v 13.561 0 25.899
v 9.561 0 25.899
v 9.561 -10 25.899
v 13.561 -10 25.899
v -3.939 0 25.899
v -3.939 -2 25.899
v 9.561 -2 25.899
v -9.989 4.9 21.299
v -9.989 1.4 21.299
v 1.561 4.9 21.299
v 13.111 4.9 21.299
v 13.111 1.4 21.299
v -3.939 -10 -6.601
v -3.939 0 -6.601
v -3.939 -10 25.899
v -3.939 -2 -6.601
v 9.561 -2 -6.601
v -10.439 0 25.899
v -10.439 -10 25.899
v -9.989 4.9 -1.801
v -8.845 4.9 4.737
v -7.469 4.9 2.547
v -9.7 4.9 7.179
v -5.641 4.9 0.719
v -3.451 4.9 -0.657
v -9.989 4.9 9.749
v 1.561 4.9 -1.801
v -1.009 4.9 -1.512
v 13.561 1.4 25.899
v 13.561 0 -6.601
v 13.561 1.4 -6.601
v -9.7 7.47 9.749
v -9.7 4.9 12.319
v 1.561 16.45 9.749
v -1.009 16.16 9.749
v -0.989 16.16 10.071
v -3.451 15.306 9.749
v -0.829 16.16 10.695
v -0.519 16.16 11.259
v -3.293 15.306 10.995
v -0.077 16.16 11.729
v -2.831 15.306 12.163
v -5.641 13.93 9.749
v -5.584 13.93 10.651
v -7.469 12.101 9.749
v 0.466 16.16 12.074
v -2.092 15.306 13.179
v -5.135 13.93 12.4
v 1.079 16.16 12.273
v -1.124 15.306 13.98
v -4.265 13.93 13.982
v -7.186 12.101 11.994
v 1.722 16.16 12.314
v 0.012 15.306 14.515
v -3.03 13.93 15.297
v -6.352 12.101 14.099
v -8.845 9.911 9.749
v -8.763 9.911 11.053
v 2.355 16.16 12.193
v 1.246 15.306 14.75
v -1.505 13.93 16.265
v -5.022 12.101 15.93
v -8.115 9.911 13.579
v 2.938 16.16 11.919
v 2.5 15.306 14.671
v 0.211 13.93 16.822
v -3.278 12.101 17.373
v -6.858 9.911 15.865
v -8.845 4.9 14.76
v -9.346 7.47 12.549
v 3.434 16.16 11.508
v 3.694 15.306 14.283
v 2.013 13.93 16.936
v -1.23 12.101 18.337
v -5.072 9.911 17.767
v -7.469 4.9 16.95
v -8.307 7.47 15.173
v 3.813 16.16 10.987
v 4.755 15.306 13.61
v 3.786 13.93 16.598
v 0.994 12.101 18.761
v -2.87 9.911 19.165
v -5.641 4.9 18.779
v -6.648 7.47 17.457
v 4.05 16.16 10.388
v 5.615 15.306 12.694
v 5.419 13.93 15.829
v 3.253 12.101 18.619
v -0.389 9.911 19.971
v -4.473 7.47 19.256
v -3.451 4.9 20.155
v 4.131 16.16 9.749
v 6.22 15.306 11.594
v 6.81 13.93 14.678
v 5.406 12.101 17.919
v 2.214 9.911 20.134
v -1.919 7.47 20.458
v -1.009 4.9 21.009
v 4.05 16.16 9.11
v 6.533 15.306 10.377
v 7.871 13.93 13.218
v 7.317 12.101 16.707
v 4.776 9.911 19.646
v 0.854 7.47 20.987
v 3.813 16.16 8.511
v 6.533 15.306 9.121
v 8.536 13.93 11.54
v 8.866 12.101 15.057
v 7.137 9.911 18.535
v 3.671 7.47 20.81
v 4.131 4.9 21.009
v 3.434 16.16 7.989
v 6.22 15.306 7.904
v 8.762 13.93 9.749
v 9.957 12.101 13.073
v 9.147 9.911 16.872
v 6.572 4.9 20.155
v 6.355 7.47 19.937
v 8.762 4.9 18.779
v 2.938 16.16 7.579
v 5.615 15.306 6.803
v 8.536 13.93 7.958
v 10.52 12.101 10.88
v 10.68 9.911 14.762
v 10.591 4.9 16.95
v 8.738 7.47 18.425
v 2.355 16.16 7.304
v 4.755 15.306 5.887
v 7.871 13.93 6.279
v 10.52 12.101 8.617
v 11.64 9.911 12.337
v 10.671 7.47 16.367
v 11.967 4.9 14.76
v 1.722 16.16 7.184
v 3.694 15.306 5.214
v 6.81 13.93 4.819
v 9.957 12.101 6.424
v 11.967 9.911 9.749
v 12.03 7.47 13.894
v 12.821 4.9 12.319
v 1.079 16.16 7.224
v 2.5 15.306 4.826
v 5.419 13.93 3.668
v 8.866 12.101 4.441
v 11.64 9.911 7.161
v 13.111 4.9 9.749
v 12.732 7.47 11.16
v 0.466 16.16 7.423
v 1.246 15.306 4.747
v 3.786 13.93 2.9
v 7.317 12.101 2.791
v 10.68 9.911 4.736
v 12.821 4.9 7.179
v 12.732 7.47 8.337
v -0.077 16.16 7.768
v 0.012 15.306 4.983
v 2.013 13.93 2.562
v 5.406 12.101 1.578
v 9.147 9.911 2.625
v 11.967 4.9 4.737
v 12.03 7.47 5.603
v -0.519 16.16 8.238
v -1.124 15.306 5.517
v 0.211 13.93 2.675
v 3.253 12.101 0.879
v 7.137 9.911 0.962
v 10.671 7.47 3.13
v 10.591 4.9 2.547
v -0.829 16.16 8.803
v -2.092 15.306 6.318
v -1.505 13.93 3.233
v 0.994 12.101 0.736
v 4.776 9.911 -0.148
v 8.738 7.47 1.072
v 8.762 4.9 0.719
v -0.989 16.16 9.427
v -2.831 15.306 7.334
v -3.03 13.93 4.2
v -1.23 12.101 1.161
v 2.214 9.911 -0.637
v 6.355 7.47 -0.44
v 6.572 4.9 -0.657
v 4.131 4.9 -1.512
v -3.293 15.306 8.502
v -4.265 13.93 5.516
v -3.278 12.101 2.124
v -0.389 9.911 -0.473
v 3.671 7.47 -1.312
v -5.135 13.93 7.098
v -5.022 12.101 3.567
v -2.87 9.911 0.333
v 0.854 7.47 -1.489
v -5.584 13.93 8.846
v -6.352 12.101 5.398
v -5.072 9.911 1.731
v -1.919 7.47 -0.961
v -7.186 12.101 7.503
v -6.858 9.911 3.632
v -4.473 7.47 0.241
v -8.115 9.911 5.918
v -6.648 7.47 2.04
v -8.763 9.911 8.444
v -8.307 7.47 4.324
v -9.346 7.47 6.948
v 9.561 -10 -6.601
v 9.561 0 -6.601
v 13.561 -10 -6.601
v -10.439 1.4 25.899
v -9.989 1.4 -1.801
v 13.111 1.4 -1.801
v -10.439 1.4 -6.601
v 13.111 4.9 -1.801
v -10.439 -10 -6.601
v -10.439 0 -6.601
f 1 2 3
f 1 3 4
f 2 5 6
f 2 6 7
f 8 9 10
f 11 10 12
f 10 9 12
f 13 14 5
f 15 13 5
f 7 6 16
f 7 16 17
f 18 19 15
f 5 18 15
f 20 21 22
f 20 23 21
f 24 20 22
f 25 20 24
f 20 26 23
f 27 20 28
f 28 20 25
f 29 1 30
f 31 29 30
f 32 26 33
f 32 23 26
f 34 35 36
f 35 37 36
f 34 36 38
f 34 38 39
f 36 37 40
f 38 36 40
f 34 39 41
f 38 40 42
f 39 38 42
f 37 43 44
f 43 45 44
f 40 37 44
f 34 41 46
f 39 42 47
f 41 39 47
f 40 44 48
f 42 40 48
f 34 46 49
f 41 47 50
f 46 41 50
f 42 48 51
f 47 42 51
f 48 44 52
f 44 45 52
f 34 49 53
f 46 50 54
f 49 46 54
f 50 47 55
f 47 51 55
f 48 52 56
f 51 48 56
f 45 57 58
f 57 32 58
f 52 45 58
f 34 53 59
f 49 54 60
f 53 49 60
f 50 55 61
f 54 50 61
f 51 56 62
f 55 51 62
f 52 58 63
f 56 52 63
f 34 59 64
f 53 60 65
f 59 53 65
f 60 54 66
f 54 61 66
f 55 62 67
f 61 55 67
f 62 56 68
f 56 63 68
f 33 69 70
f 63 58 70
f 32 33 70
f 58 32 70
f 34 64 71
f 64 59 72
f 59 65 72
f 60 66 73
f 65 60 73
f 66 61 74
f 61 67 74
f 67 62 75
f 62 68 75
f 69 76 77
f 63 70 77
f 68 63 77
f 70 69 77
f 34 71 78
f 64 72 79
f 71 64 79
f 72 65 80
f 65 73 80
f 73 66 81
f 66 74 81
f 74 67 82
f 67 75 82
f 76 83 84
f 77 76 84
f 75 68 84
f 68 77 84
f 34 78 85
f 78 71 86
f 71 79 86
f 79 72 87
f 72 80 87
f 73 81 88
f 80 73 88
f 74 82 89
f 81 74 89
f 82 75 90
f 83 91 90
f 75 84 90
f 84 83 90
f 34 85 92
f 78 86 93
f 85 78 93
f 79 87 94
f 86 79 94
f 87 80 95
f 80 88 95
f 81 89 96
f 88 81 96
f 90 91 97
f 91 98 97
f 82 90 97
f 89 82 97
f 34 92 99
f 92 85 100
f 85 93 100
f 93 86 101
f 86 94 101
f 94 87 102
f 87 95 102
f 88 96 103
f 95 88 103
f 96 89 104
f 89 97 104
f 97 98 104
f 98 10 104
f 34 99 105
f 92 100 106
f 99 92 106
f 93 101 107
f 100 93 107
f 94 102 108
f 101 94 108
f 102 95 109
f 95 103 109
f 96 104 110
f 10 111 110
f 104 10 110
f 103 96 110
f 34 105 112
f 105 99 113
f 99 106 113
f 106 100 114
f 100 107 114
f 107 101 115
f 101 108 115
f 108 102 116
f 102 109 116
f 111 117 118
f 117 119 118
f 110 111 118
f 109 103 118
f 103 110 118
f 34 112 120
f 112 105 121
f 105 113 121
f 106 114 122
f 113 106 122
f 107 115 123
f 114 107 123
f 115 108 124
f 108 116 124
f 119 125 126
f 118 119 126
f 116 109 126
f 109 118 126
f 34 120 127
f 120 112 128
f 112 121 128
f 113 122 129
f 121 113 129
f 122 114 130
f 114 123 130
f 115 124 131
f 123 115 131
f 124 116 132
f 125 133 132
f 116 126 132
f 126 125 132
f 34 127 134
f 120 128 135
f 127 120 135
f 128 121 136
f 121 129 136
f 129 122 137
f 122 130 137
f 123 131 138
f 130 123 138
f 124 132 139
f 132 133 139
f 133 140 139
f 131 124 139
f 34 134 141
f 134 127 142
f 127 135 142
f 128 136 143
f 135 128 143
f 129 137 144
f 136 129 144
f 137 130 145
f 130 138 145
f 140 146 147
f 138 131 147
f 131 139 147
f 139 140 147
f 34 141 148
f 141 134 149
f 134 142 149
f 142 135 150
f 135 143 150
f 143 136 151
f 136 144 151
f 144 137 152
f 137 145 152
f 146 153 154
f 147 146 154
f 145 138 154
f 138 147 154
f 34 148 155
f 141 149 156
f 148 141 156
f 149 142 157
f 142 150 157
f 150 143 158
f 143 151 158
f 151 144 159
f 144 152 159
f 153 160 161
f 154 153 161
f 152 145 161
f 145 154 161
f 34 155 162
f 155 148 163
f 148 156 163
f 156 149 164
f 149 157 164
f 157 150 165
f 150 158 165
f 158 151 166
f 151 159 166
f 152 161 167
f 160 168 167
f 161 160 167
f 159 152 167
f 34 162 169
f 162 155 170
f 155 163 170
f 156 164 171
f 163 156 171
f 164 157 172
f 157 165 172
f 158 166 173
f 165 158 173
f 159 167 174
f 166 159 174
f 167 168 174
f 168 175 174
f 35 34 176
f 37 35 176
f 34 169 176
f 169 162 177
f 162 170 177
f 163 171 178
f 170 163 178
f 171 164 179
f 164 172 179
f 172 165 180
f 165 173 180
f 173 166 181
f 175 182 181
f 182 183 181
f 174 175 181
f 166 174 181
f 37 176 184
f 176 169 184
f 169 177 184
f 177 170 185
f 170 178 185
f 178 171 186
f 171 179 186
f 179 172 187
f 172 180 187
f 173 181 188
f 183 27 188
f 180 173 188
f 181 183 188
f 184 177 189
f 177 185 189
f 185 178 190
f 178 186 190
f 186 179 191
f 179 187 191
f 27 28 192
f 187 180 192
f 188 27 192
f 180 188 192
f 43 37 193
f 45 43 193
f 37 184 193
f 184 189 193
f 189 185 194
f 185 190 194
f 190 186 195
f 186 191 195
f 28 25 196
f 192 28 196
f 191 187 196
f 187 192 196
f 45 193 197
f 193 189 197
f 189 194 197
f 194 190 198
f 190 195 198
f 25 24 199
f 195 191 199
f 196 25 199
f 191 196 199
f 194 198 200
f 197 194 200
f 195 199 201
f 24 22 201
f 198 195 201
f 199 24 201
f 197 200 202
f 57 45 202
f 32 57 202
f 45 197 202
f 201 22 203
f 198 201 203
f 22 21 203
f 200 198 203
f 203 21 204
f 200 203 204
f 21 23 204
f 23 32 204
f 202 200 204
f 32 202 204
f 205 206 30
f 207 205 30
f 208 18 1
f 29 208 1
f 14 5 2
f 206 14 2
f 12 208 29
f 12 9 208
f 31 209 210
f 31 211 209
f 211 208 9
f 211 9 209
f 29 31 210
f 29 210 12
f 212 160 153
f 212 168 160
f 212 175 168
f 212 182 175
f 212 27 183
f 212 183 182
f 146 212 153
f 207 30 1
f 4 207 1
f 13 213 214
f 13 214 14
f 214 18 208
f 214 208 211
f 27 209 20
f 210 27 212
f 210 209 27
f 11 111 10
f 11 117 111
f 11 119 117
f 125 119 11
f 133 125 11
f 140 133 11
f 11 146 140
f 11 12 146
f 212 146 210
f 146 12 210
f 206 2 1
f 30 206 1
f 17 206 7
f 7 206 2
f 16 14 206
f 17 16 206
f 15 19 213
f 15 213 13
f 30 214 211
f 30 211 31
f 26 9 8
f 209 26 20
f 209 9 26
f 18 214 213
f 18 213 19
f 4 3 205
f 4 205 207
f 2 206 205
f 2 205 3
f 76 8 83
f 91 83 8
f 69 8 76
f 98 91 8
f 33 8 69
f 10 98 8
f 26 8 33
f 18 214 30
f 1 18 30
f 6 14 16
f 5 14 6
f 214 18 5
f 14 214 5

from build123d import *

# Parameters (mm, degrees)
SKETCH1_W             = 24
SKETCH1_H             = 32.5
BOSS_EXTRUDE1_DEPTH   = 1.4
SKETCH2_W             = 23.1
SKETCH2_H             = 23.1
BOSS_EXTRUDE2_DEPTH   = 3.5
SKETCH5_W             = 6.5
SKETCH5_H             = 32.5
BOSS_EXTRUDE5_DEPTH   = 10
SKETCH5_W_2           = 4
BOSS_EXTRUDE5_2_DEPTH = 10
SKETCH6_W             = 13.5
SKETCH6_H             = 32.5
BOSS_EXTRUDE6_DEPTH   = 2


with BuildPart() as part:
    # Sketch1 → Boss-Extrude1 (new body)
    with BuildSketch(Plane(origin=(0, 0, 0), x_dir=(1, 0, 0), z_dir=(0, 1, 0))):
        with Locations((1.560767591, -9.648720682)):
            Rectangle(SKETCH1_W, SKETCH1_H)
    extrude(amount=BOSS_EXTRUDE1_DEPTH)

    # Sketch2 → Boss-Extrude2 (add)
    with BuildSketch(Plane(origin=(0, 1.4, 0), x_dir=(1, 0, 0), z_dir=(0, 1, 0))):
        with Locations((1.560767591, -9.748720682)):
            Rectangle(SKETCH2_W, SKETCH2_H)
    extrude(amount=BOSS_EXTRUDE2_DEPTH)

    # Sketch4 → Revolve1 (revolve)
    with BuildSketch(Plane.XY.offset(9.748720682)):
        with BuildLine():
            Line((-9.989232409, 4.9), (1.560767591, 4.9))
            Line((1.560767591, 4.9), (1.560767591, 16.45))
            ThreePointArc((1.560767591, 16.45), (-6.606315732, 13.067083323), (-9.989232409, 4.9))
        make_face()
    revolve(axis=Axis((1.560767591, 4.9, 9.748720682), (0, 1, 0)))


with BuildPart() as body_2:
    # Sketch5 → Boss-Extrude5 (new body)
    with BuildSketch(Plane.XZ):
        with Locations((-7.189232409, 9.648720682)):
            Rectangle(SKETCH5_W, SKETCH5_H)
    extrude(amount=BOSS_EXTRUDE5_DEPTH)


with BuildPart() as body_3:
    # Sketch5 → Boss-Extrude5 2 (new body)
    with BuildSketch(Plane.XZ):
        with Locations((11.560767591, 9.648720682)):
            Rectangle(SKETCH5_W_2, SKETCH5_H)
    extrude(amount=BOSS_EXTRUDE5_2_DEPTH)


with BuildPart() as body_4:
    # Sketch6 → Boss-Extrude6 (new body)
    with BuildSketch(Plane.XZ):
        with Locations((2.810767591, 9.648720682)):
            Rectangle(SKETCH6_W, SKETCH6_H)
    extrude(amount=BOSS_EXTRUDE6_DEPTH)


solid = Compound([part.part, body_2.part, body_3.part, body_4.part])
